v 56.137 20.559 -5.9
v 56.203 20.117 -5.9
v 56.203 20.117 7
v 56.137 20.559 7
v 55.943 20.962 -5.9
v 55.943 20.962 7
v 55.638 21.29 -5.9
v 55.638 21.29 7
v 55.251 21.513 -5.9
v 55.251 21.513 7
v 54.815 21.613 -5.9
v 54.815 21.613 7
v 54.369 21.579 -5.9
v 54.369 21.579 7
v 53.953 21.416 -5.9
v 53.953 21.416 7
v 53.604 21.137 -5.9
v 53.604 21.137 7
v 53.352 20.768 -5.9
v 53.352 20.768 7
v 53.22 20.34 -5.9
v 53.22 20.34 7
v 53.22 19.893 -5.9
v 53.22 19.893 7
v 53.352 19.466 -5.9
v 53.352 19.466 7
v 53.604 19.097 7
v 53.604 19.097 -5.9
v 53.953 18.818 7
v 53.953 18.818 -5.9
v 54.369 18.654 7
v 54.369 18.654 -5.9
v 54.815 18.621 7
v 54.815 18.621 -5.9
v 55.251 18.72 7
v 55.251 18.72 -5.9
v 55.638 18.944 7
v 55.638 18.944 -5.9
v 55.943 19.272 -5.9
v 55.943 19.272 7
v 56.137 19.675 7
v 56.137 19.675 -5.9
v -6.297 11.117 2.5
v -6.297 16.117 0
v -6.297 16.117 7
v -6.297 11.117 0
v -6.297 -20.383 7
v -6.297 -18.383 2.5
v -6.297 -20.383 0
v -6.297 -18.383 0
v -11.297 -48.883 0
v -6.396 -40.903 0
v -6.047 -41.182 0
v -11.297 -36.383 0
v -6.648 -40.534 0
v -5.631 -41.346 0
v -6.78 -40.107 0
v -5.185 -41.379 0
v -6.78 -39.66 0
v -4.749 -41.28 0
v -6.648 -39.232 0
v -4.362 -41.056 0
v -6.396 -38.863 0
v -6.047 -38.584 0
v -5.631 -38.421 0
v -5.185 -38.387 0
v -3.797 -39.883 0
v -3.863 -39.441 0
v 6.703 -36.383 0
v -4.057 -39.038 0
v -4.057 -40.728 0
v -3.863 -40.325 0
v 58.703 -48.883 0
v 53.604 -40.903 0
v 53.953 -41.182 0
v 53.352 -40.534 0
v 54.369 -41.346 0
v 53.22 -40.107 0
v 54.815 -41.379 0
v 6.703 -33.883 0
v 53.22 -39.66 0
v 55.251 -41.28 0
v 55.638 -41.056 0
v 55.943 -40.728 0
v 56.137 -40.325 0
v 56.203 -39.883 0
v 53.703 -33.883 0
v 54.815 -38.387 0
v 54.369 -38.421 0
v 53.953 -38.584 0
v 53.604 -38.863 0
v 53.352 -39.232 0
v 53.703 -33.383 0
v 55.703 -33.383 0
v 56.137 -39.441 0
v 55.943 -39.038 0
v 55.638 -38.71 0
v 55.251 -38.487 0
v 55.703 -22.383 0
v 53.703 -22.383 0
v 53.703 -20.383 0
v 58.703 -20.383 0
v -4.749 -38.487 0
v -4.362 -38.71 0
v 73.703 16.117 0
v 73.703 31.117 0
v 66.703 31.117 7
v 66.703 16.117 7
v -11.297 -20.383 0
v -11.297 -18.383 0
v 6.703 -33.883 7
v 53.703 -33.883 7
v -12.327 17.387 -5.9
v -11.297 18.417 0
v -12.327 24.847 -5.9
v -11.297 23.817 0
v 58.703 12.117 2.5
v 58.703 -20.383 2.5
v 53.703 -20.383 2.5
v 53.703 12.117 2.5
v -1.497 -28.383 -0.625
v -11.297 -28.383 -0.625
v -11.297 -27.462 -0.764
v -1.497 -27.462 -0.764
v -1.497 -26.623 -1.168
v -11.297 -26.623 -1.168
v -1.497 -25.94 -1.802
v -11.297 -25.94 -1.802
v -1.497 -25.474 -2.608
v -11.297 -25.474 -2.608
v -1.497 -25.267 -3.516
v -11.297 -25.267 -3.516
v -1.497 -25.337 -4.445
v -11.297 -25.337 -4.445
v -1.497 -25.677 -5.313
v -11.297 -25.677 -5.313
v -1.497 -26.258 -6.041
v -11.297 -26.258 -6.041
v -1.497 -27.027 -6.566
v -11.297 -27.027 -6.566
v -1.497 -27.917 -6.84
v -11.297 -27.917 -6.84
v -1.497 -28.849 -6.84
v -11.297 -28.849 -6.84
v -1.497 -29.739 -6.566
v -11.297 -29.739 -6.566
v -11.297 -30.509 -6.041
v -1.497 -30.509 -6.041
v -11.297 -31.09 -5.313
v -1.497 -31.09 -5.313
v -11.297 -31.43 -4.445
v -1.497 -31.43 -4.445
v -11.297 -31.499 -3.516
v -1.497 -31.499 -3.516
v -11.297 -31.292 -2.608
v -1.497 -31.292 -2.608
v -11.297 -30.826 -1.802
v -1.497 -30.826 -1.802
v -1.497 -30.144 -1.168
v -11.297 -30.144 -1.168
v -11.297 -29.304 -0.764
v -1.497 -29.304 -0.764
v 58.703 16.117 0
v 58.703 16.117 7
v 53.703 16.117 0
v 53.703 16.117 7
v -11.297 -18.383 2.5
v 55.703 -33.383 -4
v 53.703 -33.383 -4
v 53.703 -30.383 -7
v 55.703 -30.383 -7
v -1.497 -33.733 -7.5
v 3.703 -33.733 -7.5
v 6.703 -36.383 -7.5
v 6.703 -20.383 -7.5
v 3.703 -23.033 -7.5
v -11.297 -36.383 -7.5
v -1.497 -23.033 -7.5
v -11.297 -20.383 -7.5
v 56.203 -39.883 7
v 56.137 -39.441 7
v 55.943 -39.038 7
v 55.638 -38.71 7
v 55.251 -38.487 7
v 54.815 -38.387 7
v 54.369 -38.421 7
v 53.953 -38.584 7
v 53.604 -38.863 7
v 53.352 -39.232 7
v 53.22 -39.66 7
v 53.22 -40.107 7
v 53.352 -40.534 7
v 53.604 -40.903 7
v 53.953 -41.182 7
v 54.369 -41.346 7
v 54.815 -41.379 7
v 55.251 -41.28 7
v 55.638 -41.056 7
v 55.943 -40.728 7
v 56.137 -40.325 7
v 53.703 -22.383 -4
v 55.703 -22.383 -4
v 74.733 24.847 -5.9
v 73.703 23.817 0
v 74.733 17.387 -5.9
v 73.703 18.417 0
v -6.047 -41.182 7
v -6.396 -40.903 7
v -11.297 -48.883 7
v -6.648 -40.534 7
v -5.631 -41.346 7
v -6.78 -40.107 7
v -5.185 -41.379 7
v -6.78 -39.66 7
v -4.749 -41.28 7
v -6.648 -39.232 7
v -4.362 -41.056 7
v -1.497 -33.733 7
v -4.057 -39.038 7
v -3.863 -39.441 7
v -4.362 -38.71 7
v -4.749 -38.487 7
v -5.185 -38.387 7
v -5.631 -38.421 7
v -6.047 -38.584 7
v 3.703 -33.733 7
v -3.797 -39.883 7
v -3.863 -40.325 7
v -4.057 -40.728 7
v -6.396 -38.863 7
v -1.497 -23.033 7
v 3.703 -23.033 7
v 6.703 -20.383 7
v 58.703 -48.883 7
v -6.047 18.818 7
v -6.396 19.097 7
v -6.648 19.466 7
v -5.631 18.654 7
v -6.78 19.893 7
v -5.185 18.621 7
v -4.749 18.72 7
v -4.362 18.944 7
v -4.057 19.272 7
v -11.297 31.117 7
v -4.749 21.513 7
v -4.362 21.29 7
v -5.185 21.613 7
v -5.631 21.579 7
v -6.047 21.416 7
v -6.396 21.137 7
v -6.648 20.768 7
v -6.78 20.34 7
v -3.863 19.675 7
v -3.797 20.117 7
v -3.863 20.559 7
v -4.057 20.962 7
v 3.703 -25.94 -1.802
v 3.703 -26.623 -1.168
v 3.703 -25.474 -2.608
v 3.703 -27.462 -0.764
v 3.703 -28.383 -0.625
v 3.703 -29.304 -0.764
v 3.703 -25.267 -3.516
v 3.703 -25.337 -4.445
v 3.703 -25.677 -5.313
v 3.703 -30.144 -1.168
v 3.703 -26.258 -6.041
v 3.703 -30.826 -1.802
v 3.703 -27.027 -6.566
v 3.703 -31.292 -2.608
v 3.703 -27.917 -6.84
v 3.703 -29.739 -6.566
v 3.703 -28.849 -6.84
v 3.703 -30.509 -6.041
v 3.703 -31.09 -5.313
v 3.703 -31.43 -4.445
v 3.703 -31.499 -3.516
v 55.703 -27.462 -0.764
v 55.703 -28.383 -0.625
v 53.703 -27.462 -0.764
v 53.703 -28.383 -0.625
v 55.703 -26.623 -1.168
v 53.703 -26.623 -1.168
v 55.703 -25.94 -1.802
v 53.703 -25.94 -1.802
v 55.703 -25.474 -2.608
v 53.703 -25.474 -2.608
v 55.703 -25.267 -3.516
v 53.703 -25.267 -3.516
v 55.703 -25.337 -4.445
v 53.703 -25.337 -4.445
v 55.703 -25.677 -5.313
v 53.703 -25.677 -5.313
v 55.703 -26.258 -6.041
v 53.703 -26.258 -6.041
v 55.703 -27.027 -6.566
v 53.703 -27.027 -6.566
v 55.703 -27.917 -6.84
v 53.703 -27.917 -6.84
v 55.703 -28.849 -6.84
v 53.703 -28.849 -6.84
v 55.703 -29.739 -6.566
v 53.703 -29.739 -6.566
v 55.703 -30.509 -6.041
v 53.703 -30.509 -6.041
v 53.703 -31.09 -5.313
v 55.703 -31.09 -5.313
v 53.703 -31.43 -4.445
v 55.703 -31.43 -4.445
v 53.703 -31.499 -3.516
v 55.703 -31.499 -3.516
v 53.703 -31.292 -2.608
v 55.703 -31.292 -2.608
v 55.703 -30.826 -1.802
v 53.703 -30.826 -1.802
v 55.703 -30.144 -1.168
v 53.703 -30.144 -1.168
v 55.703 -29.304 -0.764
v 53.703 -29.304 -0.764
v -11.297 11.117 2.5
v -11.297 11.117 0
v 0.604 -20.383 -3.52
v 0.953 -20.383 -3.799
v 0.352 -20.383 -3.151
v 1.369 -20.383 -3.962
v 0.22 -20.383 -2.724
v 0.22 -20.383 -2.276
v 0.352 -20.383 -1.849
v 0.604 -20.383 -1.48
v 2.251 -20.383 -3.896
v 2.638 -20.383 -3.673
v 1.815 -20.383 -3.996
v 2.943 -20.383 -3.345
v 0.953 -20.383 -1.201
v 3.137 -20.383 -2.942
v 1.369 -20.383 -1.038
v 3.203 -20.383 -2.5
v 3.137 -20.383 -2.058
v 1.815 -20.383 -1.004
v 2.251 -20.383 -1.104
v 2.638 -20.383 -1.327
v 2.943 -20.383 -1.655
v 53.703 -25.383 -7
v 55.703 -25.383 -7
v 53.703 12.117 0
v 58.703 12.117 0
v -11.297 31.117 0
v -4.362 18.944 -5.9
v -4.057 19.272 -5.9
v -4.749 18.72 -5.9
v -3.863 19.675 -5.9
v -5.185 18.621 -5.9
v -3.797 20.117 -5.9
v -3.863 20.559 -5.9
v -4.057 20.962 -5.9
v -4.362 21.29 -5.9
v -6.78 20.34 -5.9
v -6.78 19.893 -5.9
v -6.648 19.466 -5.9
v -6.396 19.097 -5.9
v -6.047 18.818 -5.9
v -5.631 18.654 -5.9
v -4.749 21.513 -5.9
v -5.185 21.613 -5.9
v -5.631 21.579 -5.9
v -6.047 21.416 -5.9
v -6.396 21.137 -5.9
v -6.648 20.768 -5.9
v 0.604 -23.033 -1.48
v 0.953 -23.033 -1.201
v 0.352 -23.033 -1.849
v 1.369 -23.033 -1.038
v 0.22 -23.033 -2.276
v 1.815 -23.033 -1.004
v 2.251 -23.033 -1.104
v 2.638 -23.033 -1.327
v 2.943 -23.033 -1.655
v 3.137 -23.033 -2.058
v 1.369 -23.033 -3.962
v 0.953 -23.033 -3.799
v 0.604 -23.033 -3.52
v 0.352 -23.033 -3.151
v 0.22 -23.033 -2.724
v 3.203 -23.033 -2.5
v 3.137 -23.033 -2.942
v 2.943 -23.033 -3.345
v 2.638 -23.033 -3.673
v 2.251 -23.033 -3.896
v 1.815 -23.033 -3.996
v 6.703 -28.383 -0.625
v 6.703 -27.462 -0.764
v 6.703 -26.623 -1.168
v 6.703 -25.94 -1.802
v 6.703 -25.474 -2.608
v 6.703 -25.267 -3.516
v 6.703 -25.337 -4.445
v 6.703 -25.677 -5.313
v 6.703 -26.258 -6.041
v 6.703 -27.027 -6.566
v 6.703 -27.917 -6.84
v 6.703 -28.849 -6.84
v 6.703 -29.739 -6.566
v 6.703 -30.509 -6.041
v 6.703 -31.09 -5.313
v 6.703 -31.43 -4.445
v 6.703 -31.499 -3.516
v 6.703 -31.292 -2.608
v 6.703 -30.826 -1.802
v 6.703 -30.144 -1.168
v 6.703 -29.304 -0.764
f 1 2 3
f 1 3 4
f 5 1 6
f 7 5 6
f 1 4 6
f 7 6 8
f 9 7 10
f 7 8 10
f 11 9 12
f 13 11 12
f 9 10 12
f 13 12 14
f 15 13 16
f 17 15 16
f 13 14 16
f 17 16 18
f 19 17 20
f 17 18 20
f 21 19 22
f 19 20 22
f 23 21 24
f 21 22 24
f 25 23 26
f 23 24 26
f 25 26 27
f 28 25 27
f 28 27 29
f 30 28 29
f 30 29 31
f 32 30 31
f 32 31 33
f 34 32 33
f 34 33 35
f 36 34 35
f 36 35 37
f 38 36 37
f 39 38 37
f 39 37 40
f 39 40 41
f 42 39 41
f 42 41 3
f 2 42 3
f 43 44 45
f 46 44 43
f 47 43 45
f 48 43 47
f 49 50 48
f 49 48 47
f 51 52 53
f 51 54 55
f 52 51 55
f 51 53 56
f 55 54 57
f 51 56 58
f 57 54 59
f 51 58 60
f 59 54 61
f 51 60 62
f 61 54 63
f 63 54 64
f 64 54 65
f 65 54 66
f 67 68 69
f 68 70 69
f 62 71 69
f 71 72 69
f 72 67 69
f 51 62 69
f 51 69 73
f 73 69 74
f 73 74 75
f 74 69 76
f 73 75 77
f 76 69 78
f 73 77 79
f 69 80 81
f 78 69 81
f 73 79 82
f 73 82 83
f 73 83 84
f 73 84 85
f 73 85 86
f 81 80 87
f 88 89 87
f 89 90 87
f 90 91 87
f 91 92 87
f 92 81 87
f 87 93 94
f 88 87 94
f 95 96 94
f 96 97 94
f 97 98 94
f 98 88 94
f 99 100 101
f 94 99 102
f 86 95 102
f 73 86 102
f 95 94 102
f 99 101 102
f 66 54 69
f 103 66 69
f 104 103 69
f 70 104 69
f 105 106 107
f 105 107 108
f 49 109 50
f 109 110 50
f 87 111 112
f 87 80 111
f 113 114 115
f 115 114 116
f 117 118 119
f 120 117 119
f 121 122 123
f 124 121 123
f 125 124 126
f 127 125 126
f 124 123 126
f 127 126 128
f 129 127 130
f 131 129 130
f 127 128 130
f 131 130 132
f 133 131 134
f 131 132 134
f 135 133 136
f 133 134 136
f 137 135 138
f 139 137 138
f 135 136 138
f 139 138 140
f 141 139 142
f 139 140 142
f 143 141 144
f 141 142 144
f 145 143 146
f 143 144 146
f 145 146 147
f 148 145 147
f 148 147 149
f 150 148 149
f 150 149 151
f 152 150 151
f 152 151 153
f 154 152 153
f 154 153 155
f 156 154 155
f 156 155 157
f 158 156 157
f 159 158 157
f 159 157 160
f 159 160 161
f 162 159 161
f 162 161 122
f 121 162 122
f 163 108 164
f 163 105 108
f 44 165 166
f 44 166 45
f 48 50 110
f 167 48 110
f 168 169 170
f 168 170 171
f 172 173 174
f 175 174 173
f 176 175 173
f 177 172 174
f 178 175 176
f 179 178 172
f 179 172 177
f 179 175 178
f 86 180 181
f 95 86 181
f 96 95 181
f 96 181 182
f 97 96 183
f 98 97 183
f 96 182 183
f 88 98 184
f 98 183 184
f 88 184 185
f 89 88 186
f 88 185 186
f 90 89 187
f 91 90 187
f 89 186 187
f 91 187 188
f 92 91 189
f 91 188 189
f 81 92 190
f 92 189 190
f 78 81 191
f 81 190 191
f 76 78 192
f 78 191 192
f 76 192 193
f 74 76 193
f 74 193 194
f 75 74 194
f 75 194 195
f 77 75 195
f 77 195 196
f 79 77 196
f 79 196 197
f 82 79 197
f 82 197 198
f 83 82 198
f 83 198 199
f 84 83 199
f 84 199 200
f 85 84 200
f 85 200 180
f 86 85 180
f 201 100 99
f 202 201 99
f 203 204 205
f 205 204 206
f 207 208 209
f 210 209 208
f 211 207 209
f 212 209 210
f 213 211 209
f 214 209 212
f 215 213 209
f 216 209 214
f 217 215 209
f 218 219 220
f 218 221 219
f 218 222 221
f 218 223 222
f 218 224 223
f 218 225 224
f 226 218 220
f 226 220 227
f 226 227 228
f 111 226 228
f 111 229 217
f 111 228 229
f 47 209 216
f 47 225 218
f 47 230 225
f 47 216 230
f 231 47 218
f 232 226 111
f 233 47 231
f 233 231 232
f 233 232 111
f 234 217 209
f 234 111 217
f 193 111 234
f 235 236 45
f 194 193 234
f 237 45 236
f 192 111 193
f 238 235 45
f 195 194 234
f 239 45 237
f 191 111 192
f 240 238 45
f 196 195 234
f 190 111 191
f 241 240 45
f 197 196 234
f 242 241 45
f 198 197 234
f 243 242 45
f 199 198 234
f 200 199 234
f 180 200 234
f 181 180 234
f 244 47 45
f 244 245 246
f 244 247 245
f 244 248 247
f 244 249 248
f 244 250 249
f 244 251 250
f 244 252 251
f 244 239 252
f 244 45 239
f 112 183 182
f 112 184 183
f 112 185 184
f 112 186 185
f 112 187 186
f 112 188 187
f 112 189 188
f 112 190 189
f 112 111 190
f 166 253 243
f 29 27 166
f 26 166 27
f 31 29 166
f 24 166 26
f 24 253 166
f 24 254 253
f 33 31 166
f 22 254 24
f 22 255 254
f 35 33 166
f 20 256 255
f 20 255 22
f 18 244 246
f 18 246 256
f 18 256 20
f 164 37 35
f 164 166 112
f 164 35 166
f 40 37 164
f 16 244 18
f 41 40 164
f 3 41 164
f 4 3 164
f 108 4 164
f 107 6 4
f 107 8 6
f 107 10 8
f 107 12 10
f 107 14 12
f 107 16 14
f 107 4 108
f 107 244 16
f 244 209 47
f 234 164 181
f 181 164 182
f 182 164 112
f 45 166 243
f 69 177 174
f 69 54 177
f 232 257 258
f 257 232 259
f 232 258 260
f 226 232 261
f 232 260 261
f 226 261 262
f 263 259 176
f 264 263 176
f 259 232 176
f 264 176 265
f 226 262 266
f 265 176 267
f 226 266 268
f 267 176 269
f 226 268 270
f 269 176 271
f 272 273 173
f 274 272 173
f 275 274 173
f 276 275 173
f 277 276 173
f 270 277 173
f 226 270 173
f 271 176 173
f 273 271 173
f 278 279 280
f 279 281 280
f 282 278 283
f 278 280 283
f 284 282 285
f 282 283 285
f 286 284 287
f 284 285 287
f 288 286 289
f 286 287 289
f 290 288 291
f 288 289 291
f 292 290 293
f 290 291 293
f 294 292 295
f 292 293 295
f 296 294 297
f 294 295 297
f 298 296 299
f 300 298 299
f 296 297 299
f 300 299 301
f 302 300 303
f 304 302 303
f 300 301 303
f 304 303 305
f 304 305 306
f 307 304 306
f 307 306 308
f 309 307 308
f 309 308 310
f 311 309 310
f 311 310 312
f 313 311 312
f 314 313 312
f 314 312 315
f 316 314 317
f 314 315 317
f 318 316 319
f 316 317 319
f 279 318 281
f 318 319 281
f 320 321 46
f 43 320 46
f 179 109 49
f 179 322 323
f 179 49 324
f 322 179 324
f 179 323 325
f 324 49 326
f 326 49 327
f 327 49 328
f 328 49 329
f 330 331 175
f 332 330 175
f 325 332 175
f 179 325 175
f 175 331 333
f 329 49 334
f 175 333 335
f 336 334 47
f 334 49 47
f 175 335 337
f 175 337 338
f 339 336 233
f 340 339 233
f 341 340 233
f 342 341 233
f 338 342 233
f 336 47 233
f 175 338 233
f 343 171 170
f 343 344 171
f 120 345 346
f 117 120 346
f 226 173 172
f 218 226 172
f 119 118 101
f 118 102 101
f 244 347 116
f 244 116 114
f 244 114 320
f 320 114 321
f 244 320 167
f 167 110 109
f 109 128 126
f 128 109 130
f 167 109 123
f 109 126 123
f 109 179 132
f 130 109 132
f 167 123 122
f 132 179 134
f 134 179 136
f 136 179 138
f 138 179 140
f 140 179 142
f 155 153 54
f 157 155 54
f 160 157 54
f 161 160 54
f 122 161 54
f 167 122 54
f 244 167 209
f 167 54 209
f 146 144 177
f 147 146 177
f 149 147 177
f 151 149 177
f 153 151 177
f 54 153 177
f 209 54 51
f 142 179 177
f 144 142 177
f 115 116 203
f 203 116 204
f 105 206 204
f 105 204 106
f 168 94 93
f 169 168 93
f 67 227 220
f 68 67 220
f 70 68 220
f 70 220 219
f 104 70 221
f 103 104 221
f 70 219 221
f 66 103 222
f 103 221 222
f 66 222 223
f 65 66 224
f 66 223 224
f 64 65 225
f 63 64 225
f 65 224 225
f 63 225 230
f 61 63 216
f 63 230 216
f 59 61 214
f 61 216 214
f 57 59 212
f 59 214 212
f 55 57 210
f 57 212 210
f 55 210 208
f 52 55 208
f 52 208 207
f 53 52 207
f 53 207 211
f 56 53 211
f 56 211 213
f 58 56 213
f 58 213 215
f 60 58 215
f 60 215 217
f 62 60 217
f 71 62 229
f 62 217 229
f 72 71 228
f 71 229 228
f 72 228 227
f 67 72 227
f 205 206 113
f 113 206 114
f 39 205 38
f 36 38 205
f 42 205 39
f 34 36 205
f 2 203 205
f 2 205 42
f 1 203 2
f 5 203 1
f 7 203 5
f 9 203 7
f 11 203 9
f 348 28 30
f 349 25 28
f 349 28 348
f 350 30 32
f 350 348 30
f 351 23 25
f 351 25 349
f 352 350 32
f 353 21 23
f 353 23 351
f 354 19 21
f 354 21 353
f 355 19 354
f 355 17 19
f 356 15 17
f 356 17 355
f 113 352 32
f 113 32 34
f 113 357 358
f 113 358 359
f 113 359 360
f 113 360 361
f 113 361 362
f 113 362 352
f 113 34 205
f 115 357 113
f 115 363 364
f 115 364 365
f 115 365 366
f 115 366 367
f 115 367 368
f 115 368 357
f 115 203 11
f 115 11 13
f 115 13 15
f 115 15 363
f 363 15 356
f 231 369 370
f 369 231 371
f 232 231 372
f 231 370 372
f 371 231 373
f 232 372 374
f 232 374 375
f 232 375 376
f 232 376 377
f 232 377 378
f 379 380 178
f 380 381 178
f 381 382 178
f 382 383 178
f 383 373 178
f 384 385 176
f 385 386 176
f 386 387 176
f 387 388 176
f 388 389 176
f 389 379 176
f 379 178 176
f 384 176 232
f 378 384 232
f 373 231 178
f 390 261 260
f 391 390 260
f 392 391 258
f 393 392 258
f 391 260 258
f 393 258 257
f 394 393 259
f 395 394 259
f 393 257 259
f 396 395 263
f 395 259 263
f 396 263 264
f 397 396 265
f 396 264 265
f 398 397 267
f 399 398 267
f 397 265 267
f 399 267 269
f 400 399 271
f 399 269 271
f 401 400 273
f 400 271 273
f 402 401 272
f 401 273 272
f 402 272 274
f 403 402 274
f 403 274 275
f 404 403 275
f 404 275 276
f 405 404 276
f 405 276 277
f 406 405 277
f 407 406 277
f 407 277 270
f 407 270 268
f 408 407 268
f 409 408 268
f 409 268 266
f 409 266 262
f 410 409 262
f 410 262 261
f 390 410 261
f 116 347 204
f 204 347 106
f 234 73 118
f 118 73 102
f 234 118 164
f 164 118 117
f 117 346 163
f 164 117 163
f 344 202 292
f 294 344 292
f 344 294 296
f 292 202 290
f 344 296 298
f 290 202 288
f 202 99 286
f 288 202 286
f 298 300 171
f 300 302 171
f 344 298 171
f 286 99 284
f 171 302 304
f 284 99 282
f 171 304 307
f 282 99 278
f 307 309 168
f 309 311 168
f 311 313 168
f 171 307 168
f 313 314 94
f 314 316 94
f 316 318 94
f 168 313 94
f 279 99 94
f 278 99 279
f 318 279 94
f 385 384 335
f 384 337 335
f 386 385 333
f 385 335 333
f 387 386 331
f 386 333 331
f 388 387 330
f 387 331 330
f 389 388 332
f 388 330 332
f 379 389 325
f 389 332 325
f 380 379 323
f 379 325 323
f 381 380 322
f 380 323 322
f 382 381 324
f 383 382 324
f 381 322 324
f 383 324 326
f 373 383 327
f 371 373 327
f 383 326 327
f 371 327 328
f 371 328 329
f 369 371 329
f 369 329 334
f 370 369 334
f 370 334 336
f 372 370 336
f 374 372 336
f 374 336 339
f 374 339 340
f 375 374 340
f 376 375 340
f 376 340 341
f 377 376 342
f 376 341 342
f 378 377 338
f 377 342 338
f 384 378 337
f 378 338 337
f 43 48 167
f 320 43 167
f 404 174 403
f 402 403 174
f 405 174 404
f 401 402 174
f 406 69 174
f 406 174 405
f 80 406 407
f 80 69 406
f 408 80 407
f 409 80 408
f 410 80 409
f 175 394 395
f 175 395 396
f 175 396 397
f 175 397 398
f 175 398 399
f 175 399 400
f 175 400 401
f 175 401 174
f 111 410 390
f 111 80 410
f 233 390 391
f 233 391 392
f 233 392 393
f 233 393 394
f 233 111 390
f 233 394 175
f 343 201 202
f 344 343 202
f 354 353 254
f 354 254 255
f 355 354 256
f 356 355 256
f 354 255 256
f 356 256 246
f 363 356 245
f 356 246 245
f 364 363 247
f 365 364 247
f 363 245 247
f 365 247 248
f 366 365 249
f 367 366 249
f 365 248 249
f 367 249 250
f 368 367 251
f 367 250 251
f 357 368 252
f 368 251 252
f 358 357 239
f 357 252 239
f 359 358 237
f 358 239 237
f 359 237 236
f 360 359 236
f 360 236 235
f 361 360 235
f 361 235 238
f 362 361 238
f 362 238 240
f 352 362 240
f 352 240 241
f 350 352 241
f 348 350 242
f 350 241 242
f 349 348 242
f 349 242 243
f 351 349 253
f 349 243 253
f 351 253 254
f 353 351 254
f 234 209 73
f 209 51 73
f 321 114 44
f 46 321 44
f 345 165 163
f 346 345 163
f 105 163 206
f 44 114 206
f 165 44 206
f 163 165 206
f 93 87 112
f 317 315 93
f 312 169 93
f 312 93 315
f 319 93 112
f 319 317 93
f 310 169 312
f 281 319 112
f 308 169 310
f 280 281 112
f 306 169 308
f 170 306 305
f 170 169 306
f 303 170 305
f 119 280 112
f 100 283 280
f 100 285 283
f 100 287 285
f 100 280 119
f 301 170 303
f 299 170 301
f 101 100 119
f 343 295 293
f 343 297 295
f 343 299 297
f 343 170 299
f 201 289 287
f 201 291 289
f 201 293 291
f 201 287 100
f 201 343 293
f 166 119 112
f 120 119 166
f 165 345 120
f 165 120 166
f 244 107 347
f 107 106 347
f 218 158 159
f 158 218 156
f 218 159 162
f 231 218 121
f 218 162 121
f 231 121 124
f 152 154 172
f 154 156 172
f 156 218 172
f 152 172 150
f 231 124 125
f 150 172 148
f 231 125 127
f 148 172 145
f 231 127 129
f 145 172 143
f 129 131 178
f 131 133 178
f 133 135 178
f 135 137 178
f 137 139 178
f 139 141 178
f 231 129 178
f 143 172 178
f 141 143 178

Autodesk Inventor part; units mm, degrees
ref_plane "YZ Plane" through (0, 0, 0) normal (1, 0, 0) x (0, 1, 0)
ref_plane "XZ Plane" through (0, 0, 0) normal (0, 1, 0) x (-1, 0, 0)
sketch "Sketch1" plane through (0, 0, 0) normal (0, 0, 1) x (1, 0, 0)
  line L0 (58.7032, 31.1168) -> (-11.2968, 31.1168)
  line L1 (-11.2968, 31.1168) -> (-11.2968, -48.8832)
  line L2 (-11.2968, -48.8832) -> (58.7032, -48.8832)
  line L3 (58.7032, -48.8832) -> (58.7032, 31.1168)
  line L4 (53.7032, 16.1168) -> (-6.2968, 16.1168)
  line L5 (-6.2968, 16.1168) -> (-6.2968, -33.8832)
  line L6 (-6.2968, -33.8832) -> (53.7032, -33.8832)
  line L7 (53.7032, -33.8832) -> (53.7032, 16.1168)
  line L8 (58.7032, 31.1168) -> (73.7032, 31.1168)
  line L9 (73.7032, 31.1168) -> (73.7032, 16.1168)
  line L10 (73.7032, 16.1168) -> (58.7032, 16.1168)
  line L11 (58.7032, 16.1168) -> (58.7032, 31.1168)
  point P0 (0, 0)
  dimension "d0" = 70
  dimension "d1" = 80
  dimension "d4" = 60
  dimension "d5" = 50
  dimension "d6" = 15
  dimension "d7" = 5
  dimension "d76" = 15
  dimension "d77" = 15
extrude "Extrusion1" add sketch "Sketch1" along normal blind 7
sketch "Sketch2" plane through (0, 0, 0) normal (0, 0, -1) x (-1, 0, 0)
  line L0 (11.2968, 23.8168) -> (-73.7032, 23.8168)
  line L1 (-73.7032, 23.8168) -> (-73.7032, 18.4168)
  line L2 (-73.7032, 18.4168) -> (11.2968, 18.4168)
  line L3 (11.2968, 18.4168) -> (11.2968, 23.8168)
  line L4 (11.2968, 31.1168) -> (11.2968, -48.8832) projected
  line L5 (-58.7032, -48.8832) -> (-58.7032, 16.1168) projected
  line L6 (-73.7032, 16.1168) -> (-73.7032, 31.1168) projected
  line L7 (-73.7032, 31.1168) -> (11.2968, 31.1168) projected
  point P0 (0, 0)
  dimension "d9" = 5.4
  dimension "d10" = 0
  dimension "d78" = 0
  dimension "d79" = 7.3
extrude "Extrusion2" add sketch "Sketch2" along normal blind 5.9 draft 9.9 contours L3 L2 L1 L0
ref_plane "Work Plane1" through (-126.6696, -48.8832, -9) normal (0, 0, 1) x (1, 0, 0)
sketch "Sketch3" plane through (0, 0, 0) normal (0, 0, -1) x (-1, 0, 0)
  line L0 (11.2968, -36.3832) -> (-6.7032, -36.3832)
  line L1 (-6.7032, -36.3832) -> (-6.7032, -20.3832)
  line L2 (-6.7032, -20.3832) -> (11.2968, -20.3832)
  line L3 (11.2968, -20.3832) -> (11.2968, -36.3832)
  line L4 (11.2968, -48.8832) -> (-58.7032, -48.8832) projected
  line L5 (11.2968, 18.4168) -> (11.2968, -48.8832) projected
  line L6 (-55.7032, -33.3832) -> (-53.7032, -33.3832)
  line L7 (-53.7032, -33.3832) -> (-53.7032, -22.3832)
  line L8 (-53.7032, -22.3832) -> (-55.7032, -22.3832)
  line L9 (-55.7032, -22.3832) -> (-55.7032, -33.3832)
  line L10 (-53.7032, -33.8832) -> (6.2968, -33.8832) projected
  line L11 (-53.7032, 16.1168) -> (-53.7032, -33.8832) projected
  point P0 (0, 0)
  point P1 (-54.7032, -33.3832)
  dimension "d14" = 16
  dimension "d15" = 18
  dimension "d16" = 12.5
  dimension "d17" = 0
  dimension "d62" = 11
  dimension "d63" = 0
  dimension "d64" = 2
  dimension "d102" = 0.5
extrude "Extrusion3" add sketch "Sketch3" along normal blind 7.5
sketch "Sketch6" plane through (0, 0, 7) normal (0, 0, 1) x (1, 0, 0)
  line L0 (-6.2968, -20.3832) -> (6.7032, -20.3832) projected
  line L1 (-11.2968, -48.8832) -> (58.7032, -48.8832) projected
  line L2 (6.7032, -20.3832) -> (-11.2968, -20.3832)
  line L3 (-11.2968, -20.3832) -> (-11.2968, -48.8832)
  line L4 (-11.2968, -48.8832) -> (6.7032, -48.8832)
  line L5 (6.7032, -48.8832) -> (6.7032, -20.3832)
  point P0 (0, 0)
  point P1 (6.7032, -48.8832)
  point P2 (-6.2968, -20.3832)
extrude "Extrusion6" add sketch "Sketch6" against normal up to surface (7 mm away)
sketch "Sketch9" plane through (-11.2968, -48.8832, 7) normal (-1, 0, 0) x (0, 0, 1)
  circle A0 centre (-10.75, 20.5) radius 3.125
  line L0 (0, 80) -> (0, 0) projected
  line L1 (-7, 0) -> (0, 0) projected
  line L2 (-7, 28.5) -> (-7, 65) projected
  point P0 (-7, 48.8832)
  point P1 (-4, 28.5)
  point P2 (-7, 65)
  dimension "d44" = 6.25
  dimension "d46" = 20.5
  dimension "d65" = 3.75
extrude "Extrusion8" cut sketch "Sketch9" against normal through all
sketch "Sketch10" plane through (0, 0, -7.5) normal (0, 0, -1) x (-1, 0, 0)
  line L0 (1.4968, -23.0332) -> (-3.7032, -23.0332)
  line L1 (-3.7032, -23.0332) -> (-3.7032, -33.7332)
  line L2 (-3.7032, -33.7332) -> (1.4968, -33.7332)
  line L3 (1.4968, -33.7332) -> (1.4968, -23.0332)
  line L4 (11.2968, -20.3832) -> (-6.7032, -20.3832) projected
  line L5 (-6.7032, -36.3832) -> (11.2968, -36.3832) projected
  line L6 (-6.7032, -20.3832) -> (-6.7032, -36.3832) projected
  point P0 (0, 0)
  dimension "d49" = 5.2
  dimension "d50" = 10.7
  dimension "d51" = 2.65
  dimension "d52" = 2.65
  dimension "d53" = 3
extrude "Extrusion9" cut sketch "Sketch10" against normal through all
sketch "Sketch11" plane through (-6.2968, -20.3832, 7) normal (0, 1, 0) x (1, 0, 0)
  circle A0 centre (8, 9.5) radius 1.5
  line L0 (10, 14.5) -> (10, 0) projected
  line L1 (-5, 14.5) -> (13, 14.5) projected
  point P0 (6.2968, 7)
  dimension "d56" = 3
  dimension "d57" = 2
  dimension "d58" = 5
extrude "Extrusion10" cut sketch "Sketch11" against normal blind 5
sketch "Sketch12" plane through (0, 0, 0) normal (0, 0, -1) x (-1, 0, 0)
  line L0 (-58.7032, -20.3832) -> (-53.7032, -20.3832)
  line L1 (-53.7032, -20.3832) -> (-53.7032, 12.1168)
  line L2 (-53.7032, 12.1168) -> (-58.7032, 12.1168)
  line L3 (-58.7032, 12.1168) -> (-58.7032, -20.3832)
  line L4 (-53.7032, -22.3832) -> (-55.7032, -22.3832) projected
  line L5 (-53.7032, 16.1168) -> (-53.7032, -22.3832) projected
  line L6 (6.2968, 16.1168) -> (-53.7032, 16.1168) projected
  line L7 (-58.7032, -48.8832) -> (-58.7032, 16.1168) projected
  line L8 (6.2968, -18.3832) -> (11.2968, -18.3832)
  line L9 (11.2968, -18.3832) -> (11.2968, 11.1168)
  line L10 (11.2968, 11.1168) -> (6.2968, 11.1168)
  line L11 (6.2968, 11.1168) -> (6.2968, -18.3832)
  line L12 (11.2968, -20.3832) -> (-6.7032, -20.3832) projected
  line L13 (6.2968, -20.3832) -> (6.2968, 16.1168) projected
  line L14 (11.2968, 18.4168) -> (11.2968, -20.3832) projected
  point P0 (0, 0)
  point P1 (-58.7032, 18.2168)
  point P2 (-53.7032, -33.8832)
  dimension "d66" = 2
  dimension "d67" = 0
  dimension "d68" = 4
  dimension "d69" = 0
  dimension "d70" = 2
  dimension "d71" = 0
  dimension "d72" = 0
  dimension "d73" = 5
extrude "Extrusion11" cut sketch "Sketch12" against normal blind 2.5 contours L3 L2 L1 L0 | L11 L10 L9 L8
sketch "Sketch13" plane through (0, 0, -7.5) normal (0, 0, -1) x (-1, 0, 0)
  line L0 (-55.7032, -22.3832) -> (-55.7032, -33.3832) projected
  line L1 (-53.7032, -22.3832) -> (-55.7032, -22.3832) projected
  line L2 (-55.7032, -33.3832) -> (-53.7032, -33.3832)
  line L3 (-53.7032, -33.3832) -> (-53.7032, -22.3832)
  line L4 (-53.7032, -22.3832) -> (-55.7032, -22.3832)
  line L5 (-55.7032, -22.3832) -> (-55.7032, -33.3832)
  point P0 (0, 0)
extrude "Extrusion12" cut sketch "Sketch13" against normal blind 0.5
chamfer "Chamfer1" distance 3 angle 45 2 edges at (54.7032, -22.3832, -7) (54.7032, -33.3832, -7)
sketch "Sketch14" plane through (0, 0, 7) normal (0, 0, 1) x (1, 0, 0)
  circle A0 centre (-5.2968, 20.1168) radius 1.5
  circle A1 centre (54.7032, 20.1168) radius 1.5
  circle A2 centre (-5.2968, -39.8832) radius 1.5
  circle A3 centre (54.7032, -39.8832) radius 1.5
  line L0 (-11.2968, -48.8832) -> (58.7032, -48.8832) projected
  line L1 (58.7032, -48.8832) -> (58.7032, 16.1168) projected
  point P0 (0, 0)
  dimension "d85" = 3
  dimension "d86" = 3
  dimension "d87" = 3
  dimension "d88" = 3
  dimension "d89" = 9
  dimension "d90" = 9
  dimension "d91" = 60
  dimension "d92" = 60
  dimension "d93" = 4
  dimension "d94" = 4
  dimension "d95" = 60
  dimension "d96" = 60
extrude "Extrusion13" cut sketch "Sketch14" against normal through all
chamfer "Chamfer2" distance 7 angle 45 1 edges at (73.7032, 23.6168, 7)
equation "\"d6\" = -0.5 * d5 + 0.5 * d1"
equation "\"d70\" = d66"
equation "\"d90\" = d89"
equation "\"d92\" = d91"
equation "\"d94\" = d93"
equation "\"d96\" = d95"
properties part number "Rail_carriage_y_top_v2"
